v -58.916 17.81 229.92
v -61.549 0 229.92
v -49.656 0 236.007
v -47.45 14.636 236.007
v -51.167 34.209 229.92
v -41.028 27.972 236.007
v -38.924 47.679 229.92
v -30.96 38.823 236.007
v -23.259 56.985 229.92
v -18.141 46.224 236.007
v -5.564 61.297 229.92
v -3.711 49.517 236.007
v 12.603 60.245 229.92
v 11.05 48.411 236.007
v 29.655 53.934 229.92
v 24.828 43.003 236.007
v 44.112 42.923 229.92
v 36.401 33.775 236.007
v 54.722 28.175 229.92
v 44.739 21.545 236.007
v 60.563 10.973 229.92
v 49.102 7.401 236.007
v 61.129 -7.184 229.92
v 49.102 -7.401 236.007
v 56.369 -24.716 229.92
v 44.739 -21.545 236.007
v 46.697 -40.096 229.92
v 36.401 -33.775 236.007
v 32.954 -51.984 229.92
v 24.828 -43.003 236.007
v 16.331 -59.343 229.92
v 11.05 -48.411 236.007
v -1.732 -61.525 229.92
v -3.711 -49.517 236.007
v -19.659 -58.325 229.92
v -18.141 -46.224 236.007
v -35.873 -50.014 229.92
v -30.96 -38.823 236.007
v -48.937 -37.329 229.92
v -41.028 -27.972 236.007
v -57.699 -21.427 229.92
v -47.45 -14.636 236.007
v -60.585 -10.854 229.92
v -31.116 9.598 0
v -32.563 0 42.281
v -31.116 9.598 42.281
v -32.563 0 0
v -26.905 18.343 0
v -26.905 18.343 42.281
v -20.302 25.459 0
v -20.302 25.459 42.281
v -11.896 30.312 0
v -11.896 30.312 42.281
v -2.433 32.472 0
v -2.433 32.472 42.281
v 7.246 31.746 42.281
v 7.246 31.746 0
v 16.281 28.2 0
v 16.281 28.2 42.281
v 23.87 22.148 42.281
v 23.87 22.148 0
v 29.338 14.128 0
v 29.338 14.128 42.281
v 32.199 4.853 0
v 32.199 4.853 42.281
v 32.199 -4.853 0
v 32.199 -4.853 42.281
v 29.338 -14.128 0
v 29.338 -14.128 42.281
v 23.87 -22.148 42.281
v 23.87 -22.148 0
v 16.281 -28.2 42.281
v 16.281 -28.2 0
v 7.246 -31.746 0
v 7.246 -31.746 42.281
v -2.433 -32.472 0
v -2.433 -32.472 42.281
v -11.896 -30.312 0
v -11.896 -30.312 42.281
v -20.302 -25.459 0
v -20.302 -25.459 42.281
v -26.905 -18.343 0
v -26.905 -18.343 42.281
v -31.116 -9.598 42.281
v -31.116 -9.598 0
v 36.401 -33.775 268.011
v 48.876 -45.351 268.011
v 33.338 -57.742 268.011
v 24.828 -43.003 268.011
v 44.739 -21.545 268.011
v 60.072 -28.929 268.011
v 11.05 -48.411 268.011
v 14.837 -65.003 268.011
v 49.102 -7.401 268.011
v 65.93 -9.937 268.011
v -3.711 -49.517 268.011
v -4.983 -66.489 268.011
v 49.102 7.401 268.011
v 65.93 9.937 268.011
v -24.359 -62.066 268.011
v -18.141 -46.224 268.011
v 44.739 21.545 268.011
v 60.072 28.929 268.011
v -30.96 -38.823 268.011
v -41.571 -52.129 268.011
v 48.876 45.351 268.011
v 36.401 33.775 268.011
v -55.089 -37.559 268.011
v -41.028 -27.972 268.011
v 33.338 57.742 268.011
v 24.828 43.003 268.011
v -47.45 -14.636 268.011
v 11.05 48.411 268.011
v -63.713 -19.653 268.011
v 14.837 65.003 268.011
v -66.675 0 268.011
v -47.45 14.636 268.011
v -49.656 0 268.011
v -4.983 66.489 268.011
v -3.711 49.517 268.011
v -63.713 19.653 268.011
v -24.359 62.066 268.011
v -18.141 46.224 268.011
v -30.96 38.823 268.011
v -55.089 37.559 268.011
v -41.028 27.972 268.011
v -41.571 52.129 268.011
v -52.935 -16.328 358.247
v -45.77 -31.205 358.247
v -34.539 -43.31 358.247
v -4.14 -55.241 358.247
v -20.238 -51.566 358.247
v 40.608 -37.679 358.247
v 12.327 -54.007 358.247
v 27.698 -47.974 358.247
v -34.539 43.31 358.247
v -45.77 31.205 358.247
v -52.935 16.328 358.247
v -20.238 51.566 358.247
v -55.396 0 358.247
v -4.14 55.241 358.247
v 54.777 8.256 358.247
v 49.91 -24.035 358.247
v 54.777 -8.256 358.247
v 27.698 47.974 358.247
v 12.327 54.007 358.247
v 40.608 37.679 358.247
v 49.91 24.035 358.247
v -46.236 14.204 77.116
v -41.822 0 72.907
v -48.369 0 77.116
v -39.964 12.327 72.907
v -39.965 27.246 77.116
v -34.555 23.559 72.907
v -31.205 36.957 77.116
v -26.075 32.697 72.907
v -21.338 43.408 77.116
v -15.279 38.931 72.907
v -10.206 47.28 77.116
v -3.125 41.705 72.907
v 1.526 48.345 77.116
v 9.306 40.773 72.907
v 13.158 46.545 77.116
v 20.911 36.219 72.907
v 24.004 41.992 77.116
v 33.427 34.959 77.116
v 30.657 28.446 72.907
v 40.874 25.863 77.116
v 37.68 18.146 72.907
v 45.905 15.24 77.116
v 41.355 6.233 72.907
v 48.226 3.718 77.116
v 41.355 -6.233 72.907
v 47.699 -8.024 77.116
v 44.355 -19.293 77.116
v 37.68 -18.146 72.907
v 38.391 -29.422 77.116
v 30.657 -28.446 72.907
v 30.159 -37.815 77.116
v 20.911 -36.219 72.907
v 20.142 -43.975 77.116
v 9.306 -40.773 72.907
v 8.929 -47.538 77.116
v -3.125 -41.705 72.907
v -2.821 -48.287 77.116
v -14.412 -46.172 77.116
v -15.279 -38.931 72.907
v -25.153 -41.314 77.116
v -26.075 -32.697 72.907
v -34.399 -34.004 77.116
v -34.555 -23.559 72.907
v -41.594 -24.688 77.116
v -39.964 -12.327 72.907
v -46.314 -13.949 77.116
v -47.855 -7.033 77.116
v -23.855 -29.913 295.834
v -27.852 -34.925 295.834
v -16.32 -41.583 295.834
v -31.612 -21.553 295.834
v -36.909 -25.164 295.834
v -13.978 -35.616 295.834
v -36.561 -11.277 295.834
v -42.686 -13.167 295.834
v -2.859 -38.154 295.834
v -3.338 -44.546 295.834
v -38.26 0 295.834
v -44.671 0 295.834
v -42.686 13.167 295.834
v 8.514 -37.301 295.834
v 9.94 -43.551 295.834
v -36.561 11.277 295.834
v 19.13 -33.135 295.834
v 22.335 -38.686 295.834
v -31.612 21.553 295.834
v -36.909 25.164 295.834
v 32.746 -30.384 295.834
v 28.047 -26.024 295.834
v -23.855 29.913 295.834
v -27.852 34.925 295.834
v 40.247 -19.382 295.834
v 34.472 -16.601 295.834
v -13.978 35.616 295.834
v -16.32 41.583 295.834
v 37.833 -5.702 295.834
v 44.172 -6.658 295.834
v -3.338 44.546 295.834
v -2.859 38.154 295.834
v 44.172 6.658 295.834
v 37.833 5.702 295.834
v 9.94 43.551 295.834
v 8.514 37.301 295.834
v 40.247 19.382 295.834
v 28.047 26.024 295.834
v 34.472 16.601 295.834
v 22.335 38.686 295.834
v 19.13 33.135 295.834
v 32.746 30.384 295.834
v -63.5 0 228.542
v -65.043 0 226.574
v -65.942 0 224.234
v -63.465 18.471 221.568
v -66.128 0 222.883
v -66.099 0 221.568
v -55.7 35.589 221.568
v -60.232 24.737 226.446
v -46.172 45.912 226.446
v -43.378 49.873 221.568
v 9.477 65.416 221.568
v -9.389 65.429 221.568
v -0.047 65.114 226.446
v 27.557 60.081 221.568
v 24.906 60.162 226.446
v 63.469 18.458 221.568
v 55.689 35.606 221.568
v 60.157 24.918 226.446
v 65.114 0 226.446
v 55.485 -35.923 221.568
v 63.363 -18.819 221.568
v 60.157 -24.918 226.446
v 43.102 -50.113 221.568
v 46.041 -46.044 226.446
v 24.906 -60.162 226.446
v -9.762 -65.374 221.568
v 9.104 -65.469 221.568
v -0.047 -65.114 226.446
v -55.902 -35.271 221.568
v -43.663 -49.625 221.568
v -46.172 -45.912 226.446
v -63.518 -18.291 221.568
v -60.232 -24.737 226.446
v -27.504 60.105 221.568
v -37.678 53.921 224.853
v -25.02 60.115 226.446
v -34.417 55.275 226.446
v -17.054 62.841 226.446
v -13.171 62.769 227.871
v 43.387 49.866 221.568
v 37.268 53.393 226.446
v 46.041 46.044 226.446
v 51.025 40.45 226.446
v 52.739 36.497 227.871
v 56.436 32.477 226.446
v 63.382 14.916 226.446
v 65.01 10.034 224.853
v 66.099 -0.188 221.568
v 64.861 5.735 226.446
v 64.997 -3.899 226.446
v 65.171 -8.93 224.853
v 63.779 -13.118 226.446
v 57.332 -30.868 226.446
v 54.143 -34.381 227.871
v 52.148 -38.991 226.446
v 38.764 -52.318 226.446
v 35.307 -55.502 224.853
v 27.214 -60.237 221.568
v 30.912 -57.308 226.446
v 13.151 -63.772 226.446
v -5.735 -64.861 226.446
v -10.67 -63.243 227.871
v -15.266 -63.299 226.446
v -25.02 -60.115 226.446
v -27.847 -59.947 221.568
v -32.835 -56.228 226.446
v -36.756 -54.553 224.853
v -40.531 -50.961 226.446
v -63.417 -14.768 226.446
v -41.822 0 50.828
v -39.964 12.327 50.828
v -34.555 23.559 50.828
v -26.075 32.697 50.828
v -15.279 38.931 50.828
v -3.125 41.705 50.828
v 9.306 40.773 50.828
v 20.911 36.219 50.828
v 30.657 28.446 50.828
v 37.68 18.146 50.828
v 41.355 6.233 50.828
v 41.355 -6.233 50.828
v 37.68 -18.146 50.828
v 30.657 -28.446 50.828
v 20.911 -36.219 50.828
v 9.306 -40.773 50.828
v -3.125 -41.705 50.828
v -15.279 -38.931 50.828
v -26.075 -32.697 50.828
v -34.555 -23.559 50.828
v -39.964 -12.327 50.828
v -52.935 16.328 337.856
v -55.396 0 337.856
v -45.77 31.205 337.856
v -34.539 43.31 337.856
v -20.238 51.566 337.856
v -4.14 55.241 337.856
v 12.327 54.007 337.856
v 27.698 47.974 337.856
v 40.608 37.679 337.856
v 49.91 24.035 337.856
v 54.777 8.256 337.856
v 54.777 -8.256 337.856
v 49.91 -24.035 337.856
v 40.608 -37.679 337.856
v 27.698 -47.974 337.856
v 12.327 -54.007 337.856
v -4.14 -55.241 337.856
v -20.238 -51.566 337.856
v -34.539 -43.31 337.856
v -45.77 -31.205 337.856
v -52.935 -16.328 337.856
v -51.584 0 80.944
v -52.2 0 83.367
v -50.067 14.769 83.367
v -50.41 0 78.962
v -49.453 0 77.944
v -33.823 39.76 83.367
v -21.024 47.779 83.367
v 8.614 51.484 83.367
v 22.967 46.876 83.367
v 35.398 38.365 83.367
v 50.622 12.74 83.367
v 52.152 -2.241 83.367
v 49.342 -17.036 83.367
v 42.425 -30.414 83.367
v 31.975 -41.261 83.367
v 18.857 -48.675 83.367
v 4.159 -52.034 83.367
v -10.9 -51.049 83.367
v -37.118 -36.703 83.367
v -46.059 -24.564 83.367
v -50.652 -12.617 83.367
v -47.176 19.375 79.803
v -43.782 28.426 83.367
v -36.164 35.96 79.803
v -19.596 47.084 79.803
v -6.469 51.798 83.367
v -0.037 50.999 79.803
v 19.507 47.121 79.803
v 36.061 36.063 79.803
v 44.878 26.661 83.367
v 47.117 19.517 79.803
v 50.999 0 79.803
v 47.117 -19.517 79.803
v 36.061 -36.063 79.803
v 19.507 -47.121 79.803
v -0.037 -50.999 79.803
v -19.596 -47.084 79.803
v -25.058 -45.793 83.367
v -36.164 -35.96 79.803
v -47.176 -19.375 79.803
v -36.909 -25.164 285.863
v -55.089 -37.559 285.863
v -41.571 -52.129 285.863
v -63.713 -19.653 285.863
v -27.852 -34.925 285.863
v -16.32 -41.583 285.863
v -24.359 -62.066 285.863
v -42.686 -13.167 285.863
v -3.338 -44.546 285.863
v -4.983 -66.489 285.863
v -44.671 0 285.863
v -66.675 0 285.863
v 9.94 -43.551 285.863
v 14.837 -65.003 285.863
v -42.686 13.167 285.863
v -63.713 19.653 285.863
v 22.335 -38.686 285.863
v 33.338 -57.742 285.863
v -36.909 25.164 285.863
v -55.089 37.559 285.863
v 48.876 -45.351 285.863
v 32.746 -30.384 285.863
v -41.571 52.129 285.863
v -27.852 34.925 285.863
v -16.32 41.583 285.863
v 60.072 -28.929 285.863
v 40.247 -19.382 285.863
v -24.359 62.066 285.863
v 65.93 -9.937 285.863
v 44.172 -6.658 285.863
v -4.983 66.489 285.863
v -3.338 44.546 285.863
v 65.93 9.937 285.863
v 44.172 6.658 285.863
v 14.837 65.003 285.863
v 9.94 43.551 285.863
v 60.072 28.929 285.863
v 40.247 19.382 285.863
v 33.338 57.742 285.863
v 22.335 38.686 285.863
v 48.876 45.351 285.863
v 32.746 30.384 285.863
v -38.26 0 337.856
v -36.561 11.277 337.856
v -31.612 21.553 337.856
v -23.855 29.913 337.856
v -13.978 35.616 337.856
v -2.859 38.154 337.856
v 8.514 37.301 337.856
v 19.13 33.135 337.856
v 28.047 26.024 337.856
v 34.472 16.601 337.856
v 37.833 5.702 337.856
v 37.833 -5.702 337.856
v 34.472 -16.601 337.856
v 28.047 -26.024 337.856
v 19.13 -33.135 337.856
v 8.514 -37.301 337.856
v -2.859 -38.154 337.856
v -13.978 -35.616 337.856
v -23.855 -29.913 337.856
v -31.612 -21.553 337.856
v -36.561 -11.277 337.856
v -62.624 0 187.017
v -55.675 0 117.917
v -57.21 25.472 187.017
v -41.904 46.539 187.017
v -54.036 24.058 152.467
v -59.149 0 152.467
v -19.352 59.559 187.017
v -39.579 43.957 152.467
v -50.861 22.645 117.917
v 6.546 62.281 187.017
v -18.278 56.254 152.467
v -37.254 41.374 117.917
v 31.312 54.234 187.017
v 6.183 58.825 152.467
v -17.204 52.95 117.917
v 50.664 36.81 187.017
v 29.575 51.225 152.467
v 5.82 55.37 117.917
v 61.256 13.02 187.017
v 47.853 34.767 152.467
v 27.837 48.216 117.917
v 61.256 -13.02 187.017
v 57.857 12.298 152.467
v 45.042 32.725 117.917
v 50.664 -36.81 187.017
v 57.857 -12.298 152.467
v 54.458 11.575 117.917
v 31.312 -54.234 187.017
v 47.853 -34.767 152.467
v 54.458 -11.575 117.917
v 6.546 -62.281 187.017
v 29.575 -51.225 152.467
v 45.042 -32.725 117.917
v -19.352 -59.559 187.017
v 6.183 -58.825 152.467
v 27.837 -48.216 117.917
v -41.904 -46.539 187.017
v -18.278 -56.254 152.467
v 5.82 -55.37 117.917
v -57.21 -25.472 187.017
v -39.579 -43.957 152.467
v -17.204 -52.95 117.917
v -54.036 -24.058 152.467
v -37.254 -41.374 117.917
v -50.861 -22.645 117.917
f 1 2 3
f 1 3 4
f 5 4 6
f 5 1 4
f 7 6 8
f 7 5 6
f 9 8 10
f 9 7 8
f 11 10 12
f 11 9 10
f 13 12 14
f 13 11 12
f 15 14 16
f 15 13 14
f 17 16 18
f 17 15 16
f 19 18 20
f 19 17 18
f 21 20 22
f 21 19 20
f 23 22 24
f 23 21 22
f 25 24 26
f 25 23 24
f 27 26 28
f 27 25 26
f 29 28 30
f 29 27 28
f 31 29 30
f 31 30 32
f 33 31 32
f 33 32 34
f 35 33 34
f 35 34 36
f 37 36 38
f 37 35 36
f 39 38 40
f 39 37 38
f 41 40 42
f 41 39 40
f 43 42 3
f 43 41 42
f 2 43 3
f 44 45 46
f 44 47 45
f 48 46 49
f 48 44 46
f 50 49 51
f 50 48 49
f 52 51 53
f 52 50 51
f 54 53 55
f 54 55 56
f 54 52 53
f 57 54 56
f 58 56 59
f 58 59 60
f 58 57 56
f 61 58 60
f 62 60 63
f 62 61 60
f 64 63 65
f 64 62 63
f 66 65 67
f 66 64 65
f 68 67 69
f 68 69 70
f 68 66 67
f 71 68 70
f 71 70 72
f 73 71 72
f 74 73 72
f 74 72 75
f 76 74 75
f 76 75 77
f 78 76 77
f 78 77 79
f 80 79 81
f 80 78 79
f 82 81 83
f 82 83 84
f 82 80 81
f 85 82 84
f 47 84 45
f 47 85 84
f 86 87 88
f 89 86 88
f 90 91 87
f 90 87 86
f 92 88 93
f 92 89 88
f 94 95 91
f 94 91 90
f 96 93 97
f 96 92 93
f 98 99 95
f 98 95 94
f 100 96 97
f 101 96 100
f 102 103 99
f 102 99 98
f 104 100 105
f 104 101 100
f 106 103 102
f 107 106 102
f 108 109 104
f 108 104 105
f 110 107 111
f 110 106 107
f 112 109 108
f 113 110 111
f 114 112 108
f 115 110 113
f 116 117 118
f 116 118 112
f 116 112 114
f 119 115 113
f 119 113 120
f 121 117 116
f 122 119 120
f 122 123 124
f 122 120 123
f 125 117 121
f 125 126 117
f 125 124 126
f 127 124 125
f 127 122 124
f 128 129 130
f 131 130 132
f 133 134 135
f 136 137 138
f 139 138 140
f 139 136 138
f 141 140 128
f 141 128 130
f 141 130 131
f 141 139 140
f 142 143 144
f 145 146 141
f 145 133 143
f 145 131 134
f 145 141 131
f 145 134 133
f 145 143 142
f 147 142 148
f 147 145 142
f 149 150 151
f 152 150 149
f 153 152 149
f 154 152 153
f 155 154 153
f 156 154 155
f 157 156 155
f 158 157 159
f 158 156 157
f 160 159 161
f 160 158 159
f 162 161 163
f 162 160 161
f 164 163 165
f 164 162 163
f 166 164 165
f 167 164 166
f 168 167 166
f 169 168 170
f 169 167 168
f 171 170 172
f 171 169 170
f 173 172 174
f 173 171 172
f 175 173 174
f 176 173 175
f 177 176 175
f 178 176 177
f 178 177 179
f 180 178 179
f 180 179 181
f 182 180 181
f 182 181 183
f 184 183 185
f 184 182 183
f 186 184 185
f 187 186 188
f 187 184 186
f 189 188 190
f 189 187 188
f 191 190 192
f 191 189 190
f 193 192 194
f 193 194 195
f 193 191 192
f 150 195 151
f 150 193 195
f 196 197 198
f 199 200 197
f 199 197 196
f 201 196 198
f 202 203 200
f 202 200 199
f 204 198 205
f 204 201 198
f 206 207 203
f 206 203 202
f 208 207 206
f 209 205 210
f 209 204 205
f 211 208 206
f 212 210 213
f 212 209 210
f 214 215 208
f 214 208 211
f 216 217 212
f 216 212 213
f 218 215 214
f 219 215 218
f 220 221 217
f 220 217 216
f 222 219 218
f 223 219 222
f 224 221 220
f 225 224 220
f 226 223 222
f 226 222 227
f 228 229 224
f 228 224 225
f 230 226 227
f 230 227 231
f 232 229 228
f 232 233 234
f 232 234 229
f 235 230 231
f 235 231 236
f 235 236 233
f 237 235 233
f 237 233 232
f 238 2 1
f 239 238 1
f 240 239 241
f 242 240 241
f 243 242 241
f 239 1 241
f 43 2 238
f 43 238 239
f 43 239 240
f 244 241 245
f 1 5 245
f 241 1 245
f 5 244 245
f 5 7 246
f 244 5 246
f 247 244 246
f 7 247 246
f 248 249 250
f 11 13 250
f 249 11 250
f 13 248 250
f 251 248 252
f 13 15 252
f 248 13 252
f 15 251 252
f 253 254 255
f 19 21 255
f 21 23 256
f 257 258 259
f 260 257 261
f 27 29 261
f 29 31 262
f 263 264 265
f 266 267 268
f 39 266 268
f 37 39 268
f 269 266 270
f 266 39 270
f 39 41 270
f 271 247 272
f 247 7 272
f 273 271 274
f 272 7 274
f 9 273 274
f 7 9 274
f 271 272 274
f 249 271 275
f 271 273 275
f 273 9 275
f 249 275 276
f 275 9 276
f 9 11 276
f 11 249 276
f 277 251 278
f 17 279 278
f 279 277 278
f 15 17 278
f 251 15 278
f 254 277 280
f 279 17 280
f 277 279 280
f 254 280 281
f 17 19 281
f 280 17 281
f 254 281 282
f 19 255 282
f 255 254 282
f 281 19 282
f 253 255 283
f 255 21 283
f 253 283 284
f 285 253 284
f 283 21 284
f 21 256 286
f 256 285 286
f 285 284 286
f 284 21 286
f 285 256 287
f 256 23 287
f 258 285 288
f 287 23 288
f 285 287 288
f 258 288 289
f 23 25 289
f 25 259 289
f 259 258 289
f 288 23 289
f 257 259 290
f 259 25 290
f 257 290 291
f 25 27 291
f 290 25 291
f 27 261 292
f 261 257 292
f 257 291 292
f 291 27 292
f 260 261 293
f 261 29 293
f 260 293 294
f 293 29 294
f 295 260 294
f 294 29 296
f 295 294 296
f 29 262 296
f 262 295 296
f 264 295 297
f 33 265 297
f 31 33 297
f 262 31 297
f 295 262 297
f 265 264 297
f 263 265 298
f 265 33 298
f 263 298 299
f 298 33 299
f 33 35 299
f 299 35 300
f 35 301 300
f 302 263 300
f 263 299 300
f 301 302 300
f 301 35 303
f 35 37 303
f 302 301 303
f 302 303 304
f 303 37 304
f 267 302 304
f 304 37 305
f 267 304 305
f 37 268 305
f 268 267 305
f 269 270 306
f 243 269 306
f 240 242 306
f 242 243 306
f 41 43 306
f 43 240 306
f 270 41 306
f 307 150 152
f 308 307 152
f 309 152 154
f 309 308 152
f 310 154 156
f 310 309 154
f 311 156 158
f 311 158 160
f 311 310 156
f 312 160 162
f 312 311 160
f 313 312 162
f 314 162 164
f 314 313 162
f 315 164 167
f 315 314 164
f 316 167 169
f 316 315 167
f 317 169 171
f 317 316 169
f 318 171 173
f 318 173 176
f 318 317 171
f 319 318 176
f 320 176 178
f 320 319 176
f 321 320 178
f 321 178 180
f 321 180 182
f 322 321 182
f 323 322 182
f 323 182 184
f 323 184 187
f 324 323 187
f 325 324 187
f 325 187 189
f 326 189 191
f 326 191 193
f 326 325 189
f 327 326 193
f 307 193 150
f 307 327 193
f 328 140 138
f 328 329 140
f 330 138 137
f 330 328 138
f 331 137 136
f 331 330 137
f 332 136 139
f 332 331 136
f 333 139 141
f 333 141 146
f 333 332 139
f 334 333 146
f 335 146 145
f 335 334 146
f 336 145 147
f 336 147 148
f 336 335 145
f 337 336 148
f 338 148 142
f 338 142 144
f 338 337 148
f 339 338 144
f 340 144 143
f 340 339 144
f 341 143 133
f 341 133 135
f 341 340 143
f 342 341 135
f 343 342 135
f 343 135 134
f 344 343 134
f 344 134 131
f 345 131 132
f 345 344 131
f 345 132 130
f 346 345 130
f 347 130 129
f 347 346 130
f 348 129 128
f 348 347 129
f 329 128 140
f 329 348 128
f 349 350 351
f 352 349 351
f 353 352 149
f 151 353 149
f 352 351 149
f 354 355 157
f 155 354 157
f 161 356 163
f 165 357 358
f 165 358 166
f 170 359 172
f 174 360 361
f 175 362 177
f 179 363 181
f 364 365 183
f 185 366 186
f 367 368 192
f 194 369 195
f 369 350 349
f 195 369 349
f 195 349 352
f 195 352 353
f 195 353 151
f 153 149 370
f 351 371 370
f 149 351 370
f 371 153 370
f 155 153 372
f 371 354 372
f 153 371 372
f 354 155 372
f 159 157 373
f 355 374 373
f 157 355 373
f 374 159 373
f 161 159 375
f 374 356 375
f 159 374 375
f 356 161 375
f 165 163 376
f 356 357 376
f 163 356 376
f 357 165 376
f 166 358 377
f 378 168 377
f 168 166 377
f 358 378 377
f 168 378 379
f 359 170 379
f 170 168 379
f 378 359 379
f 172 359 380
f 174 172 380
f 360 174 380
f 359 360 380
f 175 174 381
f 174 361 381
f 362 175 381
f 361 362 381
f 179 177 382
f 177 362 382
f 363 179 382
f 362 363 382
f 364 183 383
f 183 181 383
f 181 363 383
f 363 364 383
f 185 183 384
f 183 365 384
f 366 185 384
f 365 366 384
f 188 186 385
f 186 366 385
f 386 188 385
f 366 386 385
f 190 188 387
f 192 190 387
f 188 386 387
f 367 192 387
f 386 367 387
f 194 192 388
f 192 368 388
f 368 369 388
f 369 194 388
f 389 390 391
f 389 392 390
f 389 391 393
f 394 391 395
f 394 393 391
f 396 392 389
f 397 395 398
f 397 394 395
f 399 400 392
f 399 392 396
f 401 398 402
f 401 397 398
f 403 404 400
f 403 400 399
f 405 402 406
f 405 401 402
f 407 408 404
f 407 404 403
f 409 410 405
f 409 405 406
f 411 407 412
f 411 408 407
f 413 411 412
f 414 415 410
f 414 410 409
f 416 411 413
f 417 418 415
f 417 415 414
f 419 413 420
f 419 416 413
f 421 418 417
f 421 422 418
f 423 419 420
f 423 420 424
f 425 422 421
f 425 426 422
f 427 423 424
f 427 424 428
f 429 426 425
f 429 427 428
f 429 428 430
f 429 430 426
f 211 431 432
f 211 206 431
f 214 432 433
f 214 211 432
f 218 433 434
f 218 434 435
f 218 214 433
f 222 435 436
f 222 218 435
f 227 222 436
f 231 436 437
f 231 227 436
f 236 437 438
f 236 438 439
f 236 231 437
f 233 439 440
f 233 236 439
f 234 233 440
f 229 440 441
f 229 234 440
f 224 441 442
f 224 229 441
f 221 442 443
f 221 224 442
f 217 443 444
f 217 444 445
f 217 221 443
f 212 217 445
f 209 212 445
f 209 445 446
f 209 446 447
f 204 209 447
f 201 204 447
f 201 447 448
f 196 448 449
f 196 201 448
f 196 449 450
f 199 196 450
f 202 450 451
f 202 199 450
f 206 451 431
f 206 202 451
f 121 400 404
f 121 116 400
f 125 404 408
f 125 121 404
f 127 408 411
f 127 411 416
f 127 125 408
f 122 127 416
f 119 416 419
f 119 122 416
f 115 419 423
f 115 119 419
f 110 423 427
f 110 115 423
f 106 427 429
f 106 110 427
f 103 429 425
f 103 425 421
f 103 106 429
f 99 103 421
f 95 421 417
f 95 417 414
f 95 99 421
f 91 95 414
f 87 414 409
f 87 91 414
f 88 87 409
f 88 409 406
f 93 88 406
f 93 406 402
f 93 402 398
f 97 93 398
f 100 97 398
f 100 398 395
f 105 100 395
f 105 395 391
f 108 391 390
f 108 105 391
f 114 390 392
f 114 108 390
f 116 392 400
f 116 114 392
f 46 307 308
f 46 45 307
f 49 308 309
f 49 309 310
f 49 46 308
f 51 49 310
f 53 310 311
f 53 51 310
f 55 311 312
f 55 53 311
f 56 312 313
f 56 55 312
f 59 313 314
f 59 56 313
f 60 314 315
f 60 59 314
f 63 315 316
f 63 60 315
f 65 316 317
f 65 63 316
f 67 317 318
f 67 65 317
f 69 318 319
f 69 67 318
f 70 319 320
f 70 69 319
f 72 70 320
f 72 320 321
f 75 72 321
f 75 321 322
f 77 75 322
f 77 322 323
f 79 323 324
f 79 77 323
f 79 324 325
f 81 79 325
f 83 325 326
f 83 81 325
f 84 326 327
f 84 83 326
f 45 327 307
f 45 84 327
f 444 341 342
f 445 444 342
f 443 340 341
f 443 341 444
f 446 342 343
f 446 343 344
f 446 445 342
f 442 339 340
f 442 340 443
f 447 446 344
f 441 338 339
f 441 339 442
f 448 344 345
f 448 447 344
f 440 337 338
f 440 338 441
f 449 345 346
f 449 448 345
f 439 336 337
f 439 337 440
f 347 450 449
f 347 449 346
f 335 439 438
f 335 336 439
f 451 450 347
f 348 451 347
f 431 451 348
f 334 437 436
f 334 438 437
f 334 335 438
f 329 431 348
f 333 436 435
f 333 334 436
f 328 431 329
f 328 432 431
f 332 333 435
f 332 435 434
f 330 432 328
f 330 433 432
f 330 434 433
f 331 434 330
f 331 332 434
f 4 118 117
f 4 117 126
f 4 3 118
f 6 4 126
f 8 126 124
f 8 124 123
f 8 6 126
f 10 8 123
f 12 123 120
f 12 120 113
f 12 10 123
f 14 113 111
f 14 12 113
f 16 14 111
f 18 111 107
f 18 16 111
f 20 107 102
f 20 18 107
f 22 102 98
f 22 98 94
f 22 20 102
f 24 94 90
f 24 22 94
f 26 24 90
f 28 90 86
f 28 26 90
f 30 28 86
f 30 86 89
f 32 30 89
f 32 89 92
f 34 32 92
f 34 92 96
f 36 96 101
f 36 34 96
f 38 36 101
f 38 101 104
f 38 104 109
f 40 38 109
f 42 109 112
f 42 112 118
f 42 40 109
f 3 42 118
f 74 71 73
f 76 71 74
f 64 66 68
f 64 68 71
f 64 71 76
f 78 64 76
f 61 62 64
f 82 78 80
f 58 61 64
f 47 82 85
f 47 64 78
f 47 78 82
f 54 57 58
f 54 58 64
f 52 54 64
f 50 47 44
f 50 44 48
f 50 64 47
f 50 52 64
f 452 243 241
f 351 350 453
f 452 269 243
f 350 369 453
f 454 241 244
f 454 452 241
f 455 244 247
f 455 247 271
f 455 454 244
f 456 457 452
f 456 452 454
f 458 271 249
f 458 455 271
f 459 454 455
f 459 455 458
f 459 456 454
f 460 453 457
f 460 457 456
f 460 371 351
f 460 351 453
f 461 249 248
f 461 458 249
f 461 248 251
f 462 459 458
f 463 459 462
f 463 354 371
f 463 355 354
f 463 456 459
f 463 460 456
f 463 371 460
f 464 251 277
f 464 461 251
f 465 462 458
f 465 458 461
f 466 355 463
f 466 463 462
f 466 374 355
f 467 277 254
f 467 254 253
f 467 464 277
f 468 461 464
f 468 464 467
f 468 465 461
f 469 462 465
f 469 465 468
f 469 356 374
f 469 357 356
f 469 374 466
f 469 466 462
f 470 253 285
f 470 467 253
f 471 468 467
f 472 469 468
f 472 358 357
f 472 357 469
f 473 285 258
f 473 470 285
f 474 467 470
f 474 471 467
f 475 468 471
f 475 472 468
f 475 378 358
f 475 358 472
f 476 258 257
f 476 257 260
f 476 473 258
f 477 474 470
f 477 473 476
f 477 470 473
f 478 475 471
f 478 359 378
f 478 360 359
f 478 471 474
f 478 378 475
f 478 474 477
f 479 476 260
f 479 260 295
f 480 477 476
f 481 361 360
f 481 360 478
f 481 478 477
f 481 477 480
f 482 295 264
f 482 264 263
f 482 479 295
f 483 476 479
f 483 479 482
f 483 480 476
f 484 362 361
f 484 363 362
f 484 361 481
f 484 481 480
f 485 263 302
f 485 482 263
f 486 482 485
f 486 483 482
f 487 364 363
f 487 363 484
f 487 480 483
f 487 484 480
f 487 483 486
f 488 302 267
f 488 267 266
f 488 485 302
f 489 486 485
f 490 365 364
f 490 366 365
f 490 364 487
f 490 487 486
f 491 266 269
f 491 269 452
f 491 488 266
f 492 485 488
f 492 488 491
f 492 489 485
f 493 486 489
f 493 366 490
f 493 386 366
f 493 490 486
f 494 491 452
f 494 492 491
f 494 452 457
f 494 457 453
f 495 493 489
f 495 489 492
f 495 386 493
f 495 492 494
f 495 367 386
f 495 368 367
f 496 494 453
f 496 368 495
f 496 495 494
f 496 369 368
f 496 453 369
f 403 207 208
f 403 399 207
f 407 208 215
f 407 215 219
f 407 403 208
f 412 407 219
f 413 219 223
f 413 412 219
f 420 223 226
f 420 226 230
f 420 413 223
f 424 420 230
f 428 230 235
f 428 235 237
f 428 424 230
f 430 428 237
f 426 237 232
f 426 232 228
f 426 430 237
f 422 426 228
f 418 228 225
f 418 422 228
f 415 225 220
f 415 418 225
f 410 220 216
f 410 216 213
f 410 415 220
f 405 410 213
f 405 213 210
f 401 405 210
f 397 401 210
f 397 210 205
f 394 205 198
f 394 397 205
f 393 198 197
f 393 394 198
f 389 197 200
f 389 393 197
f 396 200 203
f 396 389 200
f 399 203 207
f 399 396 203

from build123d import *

# Parameters (mm, degrees)
F3_R = 8.434765


with BuildPart() as f2:
    # F1 (on Front) → F2 (revolve)
    with BuildSketch(Plane.XZ):
        Polygon((0, 0), (0, 358.246535), (-55.39559, 358.246535), (-55.39559, 337.855637), (-38.260494, 337.855637), (-38.260494, 295.834184), (-44.670545, 295.834184), (-44.670545, 285.863012), (-66.675, 285.863012), (-66.675, 268.010706), (-49.656138, 268.010706), (-49.656138, 236.007065), (-66.675, 227.296799), (-51.792823, 79.316951), (-41.821633, 72.906896), (-41.821633, 50.827838), (-32.562673, 42.281102), (-32.562673, 0), align=None)
    revolve(axis=Axis((0, 0, 179.123268), (0, 0, -1)))

    # F3
    f3_edges = [f2.edges().sort_by_distance(p)[0] for p in [
        (66.675, 0, 227.296799),
        (51.792823, 0, 79.316951),
    ]]
    fillet(f3_edges, radius=F3_R)


solid = f2.part
